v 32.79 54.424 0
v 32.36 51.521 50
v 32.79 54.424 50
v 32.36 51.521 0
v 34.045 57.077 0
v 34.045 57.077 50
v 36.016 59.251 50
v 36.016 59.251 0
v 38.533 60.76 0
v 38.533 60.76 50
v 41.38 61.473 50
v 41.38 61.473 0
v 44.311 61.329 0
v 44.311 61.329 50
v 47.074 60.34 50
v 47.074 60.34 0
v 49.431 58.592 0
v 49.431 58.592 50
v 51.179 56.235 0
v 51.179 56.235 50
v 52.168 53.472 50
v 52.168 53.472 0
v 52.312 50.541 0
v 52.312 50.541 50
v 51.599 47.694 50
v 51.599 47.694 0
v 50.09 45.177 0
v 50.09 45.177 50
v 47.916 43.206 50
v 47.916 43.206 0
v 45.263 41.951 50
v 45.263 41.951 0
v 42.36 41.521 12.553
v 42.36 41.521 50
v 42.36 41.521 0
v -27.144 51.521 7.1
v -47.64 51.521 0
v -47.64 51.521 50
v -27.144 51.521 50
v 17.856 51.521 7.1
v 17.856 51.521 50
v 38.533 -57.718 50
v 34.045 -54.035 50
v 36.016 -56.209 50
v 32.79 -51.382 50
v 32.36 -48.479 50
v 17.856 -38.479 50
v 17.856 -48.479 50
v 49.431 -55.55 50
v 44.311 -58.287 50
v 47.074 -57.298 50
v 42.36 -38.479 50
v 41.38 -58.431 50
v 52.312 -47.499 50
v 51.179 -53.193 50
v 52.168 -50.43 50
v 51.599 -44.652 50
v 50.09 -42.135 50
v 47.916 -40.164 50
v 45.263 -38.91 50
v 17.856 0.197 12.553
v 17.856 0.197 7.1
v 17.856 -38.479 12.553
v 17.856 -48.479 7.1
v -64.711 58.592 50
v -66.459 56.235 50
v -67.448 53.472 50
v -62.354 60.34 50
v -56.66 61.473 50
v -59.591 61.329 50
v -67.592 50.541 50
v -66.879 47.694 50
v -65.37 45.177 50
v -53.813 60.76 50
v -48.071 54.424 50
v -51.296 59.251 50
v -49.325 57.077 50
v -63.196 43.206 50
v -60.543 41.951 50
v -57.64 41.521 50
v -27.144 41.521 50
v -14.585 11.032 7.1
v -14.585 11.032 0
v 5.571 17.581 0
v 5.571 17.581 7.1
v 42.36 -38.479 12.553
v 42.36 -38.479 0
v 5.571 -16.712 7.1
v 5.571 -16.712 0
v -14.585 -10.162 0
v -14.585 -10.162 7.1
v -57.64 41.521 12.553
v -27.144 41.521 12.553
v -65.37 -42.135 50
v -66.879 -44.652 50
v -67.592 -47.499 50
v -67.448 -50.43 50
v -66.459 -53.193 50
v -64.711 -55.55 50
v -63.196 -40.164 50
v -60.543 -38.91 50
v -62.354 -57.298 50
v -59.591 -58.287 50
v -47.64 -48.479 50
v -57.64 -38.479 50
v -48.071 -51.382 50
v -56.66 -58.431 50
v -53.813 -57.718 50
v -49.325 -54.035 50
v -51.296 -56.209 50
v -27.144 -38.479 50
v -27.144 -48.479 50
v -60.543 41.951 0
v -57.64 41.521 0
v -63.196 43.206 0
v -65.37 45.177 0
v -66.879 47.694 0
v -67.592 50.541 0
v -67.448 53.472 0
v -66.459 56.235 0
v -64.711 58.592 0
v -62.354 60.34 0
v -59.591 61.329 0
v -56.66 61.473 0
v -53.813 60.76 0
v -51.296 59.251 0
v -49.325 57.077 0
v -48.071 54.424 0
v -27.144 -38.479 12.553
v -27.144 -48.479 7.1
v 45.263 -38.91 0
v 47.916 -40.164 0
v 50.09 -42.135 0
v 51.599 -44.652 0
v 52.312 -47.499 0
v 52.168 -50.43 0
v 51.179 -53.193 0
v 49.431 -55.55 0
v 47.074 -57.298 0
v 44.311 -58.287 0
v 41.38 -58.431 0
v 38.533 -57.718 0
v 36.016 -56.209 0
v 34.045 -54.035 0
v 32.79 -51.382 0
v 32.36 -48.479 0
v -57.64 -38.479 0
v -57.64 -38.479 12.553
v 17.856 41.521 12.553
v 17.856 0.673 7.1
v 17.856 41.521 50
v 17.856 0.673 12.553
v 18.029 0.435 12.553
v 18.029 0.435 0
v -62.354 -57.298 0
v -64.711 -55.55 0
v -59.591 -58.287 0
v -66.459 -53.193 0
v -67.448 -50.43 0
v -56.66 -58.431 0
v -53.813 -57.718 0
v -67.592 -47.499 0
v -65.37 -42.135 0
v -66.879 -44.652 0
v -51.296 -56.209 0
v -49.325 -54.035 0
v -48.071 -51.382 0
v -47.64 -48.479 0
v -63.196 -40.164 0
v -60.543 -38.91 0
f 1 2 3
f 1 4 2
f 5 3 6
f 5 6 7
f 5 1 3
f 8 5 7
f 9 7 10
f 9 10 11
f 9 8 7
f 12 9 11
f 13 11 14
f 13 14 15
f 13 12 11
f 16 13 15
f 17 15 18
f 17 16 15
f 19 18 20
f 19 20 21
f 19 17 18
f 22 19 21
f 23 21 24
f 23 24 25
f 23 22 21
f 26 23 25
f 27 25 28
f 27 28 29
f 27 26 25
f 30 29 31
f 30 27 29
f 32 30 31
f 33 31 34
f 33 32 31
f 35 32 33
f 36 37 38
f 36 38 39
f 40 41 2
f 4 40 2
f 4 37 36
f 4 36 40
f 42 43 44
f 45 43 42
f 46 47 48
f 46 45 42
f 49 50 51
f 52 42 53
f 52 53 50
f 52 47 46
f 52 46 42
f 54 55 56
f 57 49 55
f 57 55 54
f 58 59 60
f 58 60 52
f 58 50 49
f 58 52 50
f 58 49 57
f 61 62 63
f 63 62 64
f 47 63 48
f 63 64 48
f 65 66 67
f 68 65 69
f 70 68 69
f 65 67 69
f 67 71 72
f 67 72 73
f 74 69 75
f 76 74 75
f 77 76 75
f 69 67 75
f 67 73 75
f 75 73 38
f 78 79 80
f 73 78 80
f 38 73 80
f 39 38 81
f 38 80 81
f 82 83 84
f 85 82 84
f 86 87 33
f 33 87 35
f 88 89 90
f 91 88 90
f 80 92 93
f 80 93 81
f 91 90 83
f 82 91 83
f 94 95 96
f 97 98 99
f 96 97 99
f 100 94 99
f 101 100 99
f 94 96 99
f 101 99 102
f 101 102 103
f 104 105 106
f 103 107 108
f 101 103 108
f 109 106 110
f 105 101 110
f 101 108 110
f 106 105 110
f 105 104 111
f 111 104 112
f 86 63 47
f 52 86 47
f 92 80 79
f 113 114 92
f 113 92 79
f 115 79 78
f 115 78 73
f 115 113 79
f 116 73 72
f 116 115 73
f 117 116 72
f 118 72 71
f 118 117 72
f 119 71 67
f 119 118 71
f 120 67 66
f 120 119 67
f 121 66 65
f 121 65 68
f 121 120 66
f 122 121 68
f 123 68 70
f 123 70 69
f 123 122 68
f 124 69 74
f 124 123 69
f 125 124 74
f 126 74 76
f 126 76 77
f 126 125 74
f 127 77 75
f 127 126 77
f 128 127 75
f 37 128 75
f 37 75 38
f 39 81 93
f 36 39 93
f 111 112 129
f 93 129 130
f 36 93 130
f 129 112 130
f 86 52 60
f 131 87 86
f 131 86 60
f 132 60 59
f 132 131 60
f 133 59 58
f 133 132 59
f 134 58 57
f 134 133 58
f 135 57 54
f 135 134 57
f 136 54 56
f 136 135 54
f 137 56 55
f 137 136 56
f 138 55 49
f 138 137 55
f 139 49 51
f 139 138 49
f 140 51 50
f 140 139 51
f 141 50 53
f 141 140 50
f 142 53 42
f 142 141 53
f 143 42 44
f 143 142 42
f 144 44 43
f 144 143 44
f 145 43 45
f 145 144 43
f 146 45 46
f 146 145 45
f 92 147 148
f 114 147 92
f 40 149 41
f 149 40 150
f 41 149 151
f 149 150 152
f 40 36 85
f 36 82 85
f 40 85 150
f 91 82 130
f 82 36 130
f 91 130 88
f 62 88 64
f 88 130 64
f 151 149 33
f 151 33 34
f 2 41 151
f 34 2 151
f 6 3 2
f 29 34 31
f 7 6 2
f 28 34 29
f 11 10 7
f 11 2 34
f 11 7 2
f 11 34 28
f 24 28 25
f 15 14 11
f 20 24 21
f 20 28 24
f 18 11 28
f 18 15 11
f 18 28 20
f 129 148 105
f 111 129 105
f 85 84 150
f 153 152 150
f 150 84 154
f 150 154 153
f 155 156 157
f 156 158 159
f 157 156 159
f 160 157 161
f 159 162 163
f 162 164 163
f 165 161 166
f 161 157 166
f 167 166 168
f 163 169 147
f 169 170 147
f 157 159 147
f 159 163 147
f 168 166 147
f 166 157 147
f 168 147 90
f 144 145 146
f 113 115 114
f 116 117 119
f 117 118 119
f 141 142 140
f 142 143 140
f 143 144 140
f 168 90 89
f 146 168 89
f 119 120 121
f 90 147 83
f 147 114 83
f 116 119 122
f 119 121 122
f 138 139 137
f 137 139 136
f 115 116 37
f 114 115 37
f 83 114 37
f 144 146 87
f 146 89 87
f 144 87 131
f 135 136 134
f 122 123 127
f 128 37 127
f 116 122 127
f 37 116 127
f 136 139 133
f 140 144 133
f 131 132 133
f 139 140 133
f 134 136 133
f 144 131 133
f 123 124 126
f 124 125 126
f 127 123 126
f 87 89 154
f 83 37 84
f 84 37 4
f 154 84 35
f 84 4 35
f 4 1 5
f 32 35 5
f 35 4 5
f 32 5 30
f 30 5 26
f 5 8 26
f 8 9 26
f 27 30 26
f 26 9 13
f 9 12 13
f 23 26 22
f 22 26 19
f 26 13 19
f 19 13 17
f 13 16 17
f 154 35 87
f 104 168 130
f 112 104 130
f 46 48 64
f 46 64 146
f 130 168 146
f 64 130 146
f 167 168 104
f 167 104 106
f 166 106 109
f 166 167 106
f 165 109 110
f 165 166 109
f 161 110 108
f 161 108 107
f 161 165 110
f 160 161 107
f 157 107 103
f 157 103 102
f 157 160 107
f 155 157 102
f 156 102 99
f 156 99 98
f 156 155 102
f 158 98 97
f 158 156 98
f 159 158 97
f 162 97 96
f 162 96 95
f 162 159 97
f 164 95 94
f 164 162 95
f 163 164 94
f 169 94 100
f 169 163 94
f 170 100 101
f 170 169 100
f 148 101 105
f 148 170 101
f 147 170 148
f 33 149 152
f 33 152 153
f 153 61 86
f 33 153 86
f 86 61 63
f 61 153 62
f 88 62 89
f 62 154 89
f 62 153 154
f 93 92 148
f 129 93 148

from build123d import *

# Parameters (mm, degrees)
F0_W     = 100
F0_H     = 100
F1_DEPTH = 50
F3_DEPTH = 100
F4_R     = 10
F5_DEPTH = 50
F7_DEPTH = 25
F8_W     = 80
F8_H     = 37.447
F9_DEPTH = 150


with BuildPart() as f1:
    # F0 (on Top) → F1 (new body)
    with BuildSketch(Plane.XY):
        with Locations((-7.640187, 1.520901)):
            Rectangle(F0_W, F0_H)
    extrude(amount=F1_DEPTH)

    # F2 (on face) → F3 (cut)
    with BuildSketch(Plane.XZ.offset(48.479099)):
        Polygon((0, 52.099957), (-27.144263, 52.099957), (-27.144263, 7.099957), (17.855737, 7.099957), (17.855737, 52.099957), align=None)
    extrude(amount=-F3_DEPTH, mode=Mode.SUBTRACT)

    # F4 (on face) → F5 (join)
    with BuildSketch(Plane(origin=(0, 0, 0), x_dir=(1, 0, 0), z_dir=(0, 0, -1))):
        with Locations((-57.640187, -51.520901)):
            Circle(F4_R)
        with Locations((-57.640187, 48.479099)):
            Circle(F4_R)
        with Locations((42.359813, 48.479099)):
            Circle(F4_R)
        with Locations((42.359813, -51.520901)):
            Circle(F4_R)
    extrude(amount=-F5_DEPTH)

    # F6 (on face) → F7 (cut)
    with BuildSketch(Plane(origin=(0, 0, 0), x_dir=(1, 0, 0), z_dir=(0, 0, -1))):
        Polygon((-14.585404, 10.162264), (-14.585404, -11.031568), (5.571128, -17.580822), (18.02855, -0.434652), (5.571128, 16.711519), align=None)
    extrude(amount=-F7_DEPTH, mode=Mode.SUBTRACT)

    # F8 (on face) → F9 (cut)
    with BuildSketch(Plane(origin=(-57.640187, 0, 0), x_dir=(0, -1, 0), z_dir=(-1, 0, 0))):
        with Locations((-1.520901, 31.2765)):
            Rectangle(F8_W, F8_H)
    extrude(amount=-F9_DEPTH, mode=Mode.SUBTRACT)


solid = f1.part
